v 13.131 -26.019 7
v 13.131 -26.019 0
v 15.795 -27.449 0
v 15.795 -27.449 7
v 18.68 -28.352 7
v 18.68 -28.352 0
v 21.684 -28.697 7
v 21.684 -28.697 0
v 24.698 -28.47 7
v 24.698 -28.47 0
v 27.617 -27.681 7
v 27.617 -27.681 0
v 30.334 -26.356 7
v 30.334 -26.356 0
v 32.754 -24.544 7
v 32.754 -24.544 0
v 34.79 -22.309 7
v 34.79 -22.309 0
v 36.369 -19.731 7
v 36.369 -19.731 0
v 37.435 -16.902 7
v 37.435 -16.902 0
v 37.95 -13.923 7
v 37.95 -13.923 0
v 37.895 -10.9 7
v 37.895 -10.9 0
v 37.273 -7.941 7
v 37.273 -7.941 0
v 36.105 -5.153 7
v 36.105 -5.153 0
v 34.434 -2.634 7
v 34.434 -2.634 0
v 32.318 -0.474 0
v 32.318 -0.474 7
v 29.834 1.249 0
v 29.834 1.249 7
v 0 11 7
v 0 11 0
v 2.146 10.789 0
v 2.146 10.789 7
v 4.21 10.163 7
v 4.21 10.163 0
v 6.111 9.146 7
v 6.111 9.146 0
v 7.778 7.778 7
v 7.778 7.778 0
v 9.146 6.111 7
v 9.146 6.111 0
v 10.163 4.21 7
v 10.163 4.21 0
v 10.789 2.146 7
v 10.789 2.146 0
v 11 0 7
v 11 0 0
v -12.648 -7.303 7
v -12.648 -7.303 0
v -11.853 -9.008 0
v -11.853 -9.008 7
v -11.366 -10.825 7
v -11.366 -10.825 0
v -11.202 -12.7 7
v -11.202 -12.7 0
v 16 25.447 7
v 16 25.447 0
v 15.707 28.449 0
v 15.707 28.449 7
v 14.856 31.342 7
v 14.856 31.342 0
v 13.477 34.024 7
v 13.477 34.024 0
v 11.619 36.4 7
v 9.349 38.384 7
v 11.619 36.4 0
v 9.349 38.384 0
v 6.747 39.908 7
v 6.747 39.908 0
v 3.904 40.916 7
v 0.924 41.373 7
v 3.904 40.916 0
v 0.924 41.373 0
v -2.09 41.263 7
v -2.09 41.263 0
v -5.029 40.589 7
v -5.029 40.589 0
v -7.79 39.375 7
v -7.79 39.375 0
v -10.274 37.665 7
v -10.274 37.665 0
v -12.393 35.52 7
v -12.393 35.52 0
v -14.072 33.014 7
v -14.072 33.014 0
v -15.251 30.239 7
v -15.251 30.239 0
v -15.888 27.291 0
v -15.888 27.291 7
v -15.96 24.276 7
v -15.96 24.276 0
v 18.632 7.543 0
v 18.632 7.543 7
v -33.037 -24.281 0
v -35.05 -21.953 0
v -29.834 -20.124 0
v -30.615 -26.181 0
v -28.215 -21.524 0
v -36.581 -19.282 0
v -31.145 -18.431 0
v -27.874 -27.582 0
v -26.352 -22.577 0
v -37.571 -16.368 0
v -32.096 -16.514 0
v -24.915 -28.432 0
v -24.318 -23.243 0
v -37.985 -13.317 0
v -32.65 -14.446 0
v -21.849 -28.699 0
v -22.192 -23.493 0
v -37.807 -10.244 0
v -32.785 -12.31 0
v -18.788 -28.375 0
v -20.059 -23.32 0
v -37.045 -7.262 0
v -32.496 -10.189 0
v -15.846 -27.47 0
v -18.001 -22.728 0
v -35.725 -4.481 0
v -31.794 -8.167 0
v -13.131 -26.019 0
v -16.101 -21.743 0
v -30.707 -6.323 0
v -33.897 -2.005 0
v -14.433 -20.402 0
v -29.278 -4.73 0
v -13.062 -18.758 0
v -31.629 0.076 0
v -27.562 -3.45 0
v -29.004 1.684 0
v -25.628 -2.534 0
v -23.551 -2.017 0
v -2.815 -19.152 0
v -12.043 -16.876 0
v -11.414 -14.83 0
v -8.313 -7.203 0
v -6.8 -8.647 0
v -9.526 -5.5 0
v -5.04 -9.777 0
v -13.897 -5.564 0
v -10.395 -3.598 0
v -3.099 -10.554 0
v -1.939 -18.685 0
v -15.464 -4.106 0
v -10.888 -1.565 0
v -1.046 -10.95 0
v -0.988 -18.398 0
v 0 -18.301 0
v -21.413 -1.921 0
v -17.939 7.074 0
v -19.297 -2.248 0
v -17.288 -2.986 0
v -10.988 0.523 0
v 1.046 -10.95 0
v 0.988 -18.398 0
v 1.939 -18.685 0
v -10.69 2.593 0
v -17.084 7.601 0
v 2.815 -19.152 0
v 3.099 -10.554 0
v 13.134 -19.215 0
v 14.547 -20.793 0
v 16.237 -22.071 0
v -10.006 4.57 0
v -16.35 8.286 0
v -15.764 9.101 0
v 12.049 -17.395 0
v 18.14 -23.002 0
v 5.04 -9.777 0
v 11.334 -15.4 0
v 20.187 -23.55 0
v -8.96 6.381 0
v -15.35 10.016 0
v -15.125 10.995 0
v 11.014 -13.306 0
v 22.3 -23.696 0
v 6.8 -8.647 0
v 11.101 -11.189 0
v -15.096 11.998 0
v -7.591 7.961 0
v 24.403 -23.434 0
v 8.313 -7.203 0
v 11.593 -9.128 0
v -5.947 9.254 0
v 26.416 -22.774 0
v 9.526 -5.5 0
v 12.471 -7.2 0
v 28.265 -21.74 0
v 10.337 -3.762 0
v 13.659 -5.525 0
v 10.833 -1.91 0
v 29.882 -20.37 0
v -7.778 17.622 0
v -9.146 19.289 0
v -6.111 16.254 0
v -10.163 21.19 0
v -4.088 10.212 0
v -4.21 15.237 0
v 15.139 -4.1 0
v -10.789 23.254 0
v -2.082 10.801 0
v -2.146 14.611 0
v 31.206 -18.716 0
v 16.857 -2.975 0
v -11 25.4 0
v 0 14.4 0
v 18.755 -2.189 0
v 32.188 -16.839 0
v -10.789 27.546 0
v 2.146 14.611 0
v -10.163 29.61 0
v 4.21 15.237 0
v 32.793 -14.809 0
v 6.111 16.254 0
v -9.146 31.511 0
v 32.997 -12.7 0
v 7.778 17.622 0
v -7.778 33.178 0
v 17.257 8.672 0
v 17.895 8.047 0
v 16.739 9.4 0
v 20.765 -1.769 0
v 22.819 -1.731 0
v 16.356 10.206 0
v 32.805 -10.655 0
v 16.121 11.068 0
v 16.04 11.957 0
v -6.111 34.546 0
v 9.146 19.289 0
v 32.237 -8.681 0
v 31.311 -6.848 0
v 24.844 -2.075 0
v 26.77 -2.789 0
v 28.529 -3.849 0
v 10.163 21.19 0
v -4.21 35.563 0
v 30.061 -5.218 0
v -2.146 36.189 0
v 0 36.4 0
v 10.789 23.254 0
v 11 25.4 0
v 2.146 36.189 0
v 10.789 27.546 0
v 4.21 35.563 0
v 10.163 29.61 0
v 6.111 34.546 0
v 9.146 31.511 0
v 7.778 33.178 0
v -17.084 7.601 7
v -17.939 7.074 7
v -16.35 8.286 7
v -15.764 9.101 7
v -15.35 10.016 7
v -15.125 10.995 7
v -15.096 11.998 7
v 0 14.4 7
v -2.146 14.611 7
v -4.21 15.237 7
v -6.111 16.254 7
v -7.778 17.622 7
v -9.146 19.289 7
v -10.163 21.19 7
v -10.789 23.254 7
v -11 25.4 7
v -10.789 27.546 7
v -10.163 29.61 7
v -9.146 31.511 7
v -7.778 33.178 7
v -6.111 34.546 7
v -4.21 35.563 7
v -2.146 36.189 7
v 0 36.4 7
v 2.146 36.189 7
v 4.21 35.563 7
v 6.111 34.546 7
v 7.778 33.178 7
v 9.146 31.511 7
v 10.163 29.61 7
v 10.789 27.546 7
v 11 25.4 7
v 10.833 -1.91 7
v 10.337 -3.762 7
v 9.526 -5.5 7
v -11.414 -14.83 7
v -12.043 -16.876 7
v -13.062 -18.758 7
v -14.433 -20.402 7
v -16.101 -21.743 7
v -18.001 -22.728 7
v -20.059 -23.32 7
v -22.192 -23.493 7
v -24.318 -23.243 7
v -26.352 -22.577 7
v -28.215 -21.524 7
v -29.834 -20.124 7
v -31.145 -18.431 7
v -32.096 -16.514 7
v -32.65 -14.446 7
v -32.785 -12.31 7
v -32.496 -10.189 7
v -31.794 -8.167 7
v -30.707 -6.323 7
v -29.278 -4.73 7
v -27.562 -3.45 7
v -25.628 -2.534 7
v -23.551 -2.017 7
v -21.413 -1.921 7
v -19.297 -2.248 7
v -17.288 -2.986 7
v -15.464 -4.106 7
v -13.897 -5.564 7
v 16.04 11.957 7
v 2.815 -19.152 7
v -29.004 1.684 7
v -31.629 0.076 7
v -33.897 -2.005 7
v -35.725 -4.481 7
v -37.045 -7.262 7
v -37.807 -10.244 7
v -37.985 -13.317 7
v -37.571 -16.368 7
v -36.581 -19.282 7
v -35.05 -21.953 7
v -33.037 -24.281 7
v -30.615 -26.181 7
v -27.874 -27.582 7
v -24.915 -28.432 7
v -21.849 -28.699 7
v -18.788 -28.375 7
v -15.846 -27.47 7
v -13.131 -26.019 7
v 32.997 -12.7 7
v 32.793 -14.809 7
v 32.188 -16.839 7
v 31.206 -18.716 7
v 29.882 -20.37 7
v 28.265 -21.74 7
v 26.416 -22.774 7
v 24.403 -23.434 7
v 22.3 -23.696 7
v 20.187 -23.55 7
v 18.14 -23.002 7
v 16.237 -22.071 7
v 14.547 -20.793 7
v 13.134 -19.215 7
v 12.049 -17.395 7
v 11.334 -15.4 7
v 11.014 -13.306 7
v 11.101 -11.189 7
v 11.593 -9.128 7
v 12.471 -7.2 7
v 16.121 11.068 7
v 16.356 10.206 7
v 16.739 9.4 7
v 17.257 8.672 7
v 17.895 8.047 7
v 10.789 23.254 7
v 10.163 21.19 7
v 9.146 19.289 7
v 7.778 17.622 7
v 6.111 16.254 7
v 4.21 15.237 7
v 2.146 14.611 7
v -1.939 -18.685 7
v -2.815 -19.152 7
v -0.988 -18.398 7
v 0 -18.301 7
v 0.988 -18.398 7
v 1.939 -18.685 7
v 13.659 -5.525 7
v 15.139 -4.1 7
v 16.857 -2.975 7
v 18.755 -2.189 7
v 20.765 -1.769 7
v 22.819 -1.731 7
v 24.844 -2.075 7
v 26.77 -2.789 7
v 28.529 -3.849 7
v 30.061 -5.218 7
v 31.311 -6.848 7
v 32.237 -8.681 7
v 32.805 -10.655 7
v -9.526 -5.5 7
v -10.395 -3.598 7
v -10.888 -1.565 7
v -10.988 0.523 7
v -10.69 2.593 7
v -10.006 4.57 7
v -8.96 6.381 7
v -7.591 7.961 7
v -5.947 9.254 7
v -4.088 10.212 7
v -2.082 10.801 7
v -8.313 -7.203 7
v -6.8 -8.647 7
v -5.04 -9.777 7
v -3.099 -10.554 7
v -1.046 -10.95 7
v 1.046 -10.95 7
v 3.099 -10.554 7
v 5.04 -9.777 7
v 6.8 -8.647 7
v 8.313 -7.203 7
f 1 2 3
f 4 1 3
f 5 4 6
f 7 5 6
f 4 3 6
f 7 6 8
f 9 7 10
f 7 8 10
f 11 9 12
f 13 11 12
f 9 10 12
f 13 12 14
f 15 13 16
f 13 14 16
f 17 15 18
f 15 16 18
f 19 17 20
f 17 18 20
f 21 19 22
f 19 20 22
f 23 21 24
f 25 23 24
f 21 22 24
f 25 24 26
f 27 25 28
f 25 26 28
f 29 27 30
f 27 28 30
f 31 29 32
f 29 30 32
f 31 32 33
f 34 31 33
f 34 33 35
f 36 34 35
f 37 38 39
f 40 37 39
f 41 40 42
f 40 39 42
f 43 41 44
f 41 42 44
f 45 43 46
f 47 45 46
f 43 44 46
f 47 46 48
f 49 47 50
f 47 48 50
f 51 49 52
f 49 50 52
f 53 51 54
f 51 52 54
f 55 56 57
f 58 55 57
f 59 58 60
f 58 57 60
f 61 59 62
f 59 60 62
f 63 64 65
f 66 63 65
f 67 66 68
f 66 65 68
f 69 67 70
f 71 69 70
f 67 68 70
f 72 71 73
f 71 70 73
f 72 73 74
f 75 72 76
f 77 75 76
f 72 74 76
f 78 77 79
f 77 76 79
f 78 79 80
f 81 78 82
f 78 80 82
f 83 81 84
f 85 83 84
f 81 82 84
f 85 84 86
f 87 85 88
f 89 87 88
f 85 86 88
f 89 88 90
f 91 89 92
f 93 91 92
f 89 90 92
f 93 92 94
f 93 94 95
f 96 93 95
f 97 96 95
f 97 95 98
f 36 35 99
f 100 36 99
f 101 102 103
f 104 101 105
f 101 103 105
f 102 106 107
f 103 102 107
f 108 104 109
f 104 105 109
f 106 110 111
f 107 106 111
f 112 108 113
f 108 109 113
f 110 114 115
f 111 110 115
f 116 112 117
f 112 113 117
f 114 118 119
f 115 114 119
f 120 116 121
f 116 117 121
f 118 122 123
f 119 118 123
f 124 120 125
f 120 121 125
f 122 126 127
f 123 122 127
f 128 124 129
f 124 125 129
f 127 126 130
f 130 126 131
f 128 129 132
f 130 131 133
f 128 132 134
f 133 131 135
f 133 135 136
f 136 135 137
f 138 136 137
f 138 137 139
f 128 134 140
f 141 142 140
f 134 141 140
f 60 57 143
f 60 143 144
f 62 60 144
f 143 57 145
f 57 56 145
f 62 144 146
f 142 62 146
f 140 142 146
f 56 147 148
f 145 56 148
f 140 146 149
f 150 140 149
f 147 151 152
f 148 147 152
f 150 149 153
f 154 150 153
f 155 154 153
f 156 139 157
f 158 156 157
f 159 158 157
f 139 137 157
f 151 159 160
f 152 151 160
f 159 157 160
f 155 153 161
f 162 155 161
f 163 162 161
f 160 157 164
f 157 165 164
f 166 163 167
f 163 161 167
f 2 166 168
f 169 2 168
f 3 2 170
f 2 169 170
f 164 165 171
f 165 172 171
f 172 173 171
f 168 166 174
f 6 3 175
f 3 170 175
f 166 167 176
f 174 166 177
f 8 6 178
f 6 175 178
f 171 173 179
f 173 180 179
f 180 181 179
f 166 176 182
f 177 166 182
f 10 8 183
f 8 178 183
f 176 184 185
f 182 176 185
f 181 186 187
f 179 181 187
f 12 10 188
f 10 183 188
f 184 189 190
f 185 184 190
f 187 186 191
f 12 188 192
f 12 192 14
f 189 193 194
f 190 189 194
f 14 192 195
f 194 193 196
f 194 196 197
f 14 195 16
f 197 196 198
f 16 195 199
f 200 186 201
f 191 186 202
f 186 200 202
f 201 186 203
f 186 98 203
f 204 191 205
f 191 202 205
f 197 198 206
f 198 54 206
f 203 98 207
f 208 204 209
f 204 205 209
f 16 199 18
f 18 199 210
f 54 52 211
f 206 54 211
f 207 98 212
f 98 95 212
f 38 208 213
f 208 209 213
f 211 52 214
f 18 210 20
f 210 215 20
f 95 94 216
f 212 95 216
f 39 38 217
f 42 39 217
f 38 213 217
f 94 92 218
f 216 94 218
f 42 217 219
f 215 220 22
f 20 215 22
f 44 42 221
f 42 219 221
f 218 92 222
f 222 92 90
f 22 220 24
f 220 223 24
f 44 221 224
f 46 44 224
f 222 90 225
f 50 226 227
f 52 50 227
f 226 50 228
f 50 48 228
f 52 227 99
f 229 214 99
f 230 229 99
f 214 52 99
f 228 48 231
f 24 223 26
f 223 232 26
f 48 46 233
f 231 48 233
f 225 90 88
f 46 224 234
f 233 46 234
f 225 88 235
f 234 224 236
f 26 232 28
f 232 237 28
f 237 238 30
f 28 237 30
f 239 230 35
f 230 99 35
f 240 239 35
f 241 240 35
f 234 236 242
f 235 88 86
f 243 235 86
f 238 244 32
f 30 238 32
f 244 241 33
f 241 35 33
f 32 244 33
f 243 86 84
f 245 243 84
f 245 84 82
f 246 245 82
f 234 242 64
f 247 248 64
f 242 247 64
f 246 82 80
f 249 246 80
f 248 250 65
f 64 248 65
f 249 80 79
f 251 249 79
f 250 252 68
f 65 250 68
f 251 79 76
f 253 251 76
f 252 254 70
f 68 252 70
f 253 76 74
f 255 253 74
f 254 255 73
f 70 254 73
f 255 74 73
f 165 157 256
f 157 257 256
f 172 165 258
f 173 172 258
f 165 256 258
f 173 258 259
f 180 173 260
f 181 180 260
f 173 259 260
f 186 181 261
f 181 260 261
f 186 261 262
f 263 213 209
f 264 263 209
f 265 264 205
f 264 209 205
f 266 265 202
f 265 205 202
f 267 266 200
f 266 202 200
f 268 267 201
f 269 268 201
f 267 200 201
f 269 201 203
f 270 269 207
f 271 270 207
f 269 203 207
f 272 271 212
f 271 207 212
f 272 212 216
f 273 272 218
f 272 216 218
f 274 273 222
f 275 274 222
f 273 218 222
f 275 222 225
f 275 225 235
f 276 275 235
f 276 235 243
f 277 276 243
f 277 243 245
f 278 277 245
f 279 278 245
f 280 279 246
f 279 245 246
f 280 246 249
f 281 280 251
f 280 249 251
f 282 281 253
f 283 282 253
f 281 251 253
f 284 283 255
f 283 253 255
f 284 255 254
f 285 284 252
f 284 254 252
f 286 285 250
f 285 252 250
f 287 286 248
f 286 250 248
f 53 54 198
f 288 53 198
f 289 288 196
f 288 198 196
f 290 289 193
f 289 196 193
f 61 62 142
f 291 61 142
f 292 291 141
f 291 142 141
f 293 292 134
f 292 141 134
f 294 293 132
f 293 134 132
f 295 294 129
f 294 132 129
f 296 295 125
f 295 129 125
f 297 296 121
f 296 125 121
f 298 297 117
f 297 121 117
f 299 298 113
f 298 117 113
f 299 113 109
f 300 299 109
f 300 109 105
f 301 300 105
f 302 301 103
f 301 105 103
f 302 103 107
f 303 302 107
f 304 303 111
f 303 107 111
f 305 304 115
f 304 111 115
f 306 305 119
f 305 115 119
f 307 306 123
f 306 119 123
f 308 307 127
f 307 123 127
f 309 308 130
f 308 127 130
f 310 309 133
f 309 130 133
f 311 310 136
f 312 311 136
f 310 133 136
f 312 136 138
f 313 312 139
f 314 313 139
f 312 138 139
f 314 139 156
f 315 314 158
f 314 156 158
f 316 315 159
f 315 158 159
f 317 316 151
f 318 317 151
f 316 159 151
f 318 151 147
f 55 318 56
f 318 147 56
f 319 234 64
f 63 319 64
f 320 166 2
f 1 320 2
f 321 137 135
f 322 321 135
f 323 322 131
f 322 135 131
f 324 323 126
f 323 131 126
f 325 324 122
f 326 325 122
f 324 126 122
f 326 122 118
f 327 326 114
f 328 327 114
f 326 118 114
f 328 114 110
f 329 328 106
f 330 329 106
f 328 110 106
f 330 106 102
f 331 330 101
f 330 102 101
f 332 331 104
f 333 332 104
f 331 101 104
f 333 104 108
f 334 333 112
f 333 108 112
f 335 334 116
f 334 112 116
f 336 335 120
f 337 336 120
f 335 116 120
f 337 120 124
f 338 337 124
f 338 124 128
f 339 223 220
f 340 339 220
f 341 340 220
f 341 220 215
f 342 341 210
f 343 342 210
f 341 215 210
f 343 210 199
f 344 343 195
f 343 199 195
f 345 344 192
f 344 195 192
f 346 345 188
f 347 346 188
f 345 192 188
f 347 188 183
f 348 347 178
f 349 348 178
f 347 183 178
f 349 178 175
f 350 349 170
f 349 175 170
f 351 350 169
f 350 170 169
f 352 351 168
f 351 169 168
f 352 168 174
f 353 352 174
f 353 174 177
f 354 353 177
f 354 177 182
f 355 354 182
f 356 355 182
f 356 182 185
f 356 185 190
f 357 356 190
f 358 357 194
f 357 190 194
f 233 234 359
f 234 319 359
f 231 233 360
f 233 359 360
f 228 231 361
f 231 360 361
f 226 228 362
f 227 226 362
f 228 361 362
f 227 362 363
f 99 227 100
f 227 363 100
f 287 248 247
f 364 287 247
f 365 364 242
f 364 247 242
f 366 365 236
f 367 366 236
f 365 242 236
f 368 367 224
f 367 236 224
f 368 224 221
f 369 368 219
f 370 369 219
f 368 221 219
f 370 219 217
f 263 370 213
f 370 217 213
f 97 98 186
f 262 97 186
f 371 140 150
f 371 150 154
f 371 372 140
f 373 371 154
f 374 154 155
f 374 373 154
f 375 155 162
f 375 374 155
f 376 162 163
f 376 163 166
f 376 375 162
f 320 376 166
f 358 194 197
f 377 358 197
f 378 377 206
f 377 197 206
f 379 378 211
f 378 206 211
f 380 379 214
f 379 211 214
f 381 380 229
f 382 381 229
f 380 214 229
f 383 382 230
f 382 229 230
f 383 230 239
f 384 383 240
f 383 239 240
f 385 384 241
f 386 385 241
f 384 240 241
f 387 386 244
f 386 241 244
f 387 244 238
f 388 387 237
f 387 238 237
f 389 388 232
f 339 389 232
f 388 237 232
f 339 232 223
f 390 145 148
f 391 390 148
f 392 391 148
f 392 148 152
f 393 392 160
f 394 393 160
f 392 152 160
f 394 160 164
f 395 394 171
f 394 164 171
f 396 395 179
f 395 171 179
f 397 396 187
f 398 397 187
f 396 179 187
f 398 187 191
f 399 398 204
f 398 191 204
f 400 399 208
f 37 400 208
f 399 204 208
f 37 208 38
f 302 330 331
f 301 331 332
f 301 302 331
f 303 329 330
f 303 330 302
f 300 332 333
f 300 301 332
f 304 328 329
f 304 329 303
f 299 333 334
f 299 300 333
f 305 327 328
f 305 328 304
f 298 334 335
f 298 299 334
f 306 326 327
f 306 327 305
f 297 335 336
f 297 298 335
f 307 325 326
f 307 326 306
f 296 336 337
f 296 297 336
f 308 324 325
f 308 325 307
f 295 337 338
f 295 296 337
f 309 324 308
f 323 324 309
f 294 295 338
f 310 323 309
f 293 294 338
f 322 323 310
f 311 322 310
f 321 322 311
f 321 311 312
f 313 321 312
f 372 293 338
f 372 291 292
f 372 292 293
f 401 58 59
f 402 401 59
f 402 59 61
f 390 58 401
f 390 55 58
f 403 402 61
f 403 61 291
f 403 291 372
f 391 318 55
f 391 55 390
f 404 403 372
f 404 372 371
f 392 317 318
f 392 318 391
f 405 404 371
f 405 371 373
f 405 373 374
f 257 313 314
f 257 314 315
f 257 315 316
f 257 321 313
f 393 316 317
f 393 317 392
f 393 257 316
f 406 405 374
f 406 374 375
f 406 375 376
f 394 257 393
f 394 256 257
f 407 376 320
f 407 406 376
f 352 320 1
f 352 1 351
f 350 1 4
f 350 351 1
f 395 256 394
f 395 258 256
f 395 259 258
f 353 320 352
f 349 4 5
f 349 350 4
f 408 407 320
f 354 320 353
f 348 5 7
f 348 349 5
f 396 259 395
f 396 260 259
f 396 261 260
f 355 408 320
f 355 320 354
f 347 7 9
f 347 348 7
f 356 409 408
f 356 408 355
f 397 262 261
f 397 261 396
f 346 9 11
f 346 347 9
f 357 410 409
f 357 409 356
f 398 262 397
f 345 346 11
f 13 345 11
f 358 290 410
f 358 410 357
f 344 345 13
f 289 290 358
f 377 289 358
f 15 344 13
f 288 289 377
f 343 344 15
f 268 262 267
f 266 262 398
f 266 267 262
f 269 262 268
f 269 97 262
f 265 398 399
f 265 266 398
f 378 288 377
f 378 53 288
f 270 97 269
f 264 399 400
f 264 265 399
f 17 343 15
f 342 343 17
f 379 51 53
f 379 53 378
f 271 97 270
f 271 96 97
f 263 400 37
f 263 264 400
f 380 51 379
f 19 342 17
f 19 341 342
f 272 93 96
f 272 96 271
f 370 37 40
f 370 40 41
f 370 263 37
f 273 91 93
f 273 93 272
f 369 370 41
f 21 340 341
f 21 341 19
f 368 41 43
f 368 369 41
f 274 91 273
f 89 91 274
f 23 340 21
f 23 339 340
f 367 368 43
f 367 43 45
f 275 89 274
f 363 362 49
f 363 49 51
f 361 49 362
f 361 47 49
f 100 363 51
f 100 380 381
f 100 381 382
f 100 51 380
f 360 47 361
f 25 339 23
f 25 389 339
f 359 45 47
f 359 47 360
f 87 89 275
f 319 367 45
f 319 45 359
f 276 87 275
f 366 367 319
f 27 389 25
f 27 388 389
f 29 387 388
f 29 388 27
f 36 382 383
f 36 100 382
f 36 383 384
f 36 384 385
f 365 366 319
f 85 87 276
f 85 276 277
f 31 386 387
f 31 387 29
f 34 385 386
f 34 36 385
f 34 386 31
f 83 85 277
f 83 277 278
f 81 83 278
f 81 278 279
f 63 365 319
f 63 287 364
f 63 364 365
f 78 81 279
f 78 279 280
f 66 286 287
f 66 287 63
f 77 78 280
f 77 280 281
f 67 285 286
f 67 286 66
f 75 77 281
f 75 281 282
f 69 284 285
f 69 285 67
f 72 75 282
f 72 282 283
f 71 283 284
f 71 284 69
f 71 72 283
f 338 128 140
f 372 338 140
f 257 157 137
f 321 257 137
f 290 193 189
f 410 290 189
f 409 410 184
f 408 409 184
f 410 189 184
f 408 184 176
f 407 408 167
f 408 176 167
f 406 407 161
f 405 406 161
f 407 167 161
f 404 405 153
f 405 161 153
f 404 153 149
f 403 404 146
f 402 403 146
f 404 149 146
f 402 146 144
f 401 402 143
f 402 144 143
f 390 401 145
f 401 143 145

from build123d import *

# Parameters (mm, degrees)
F1_DEPTH = 7
F2_R     = 5.08


with BuildPart() as f1:
    # F0 (on Top) → F1 (new body)
    with BuildSketch(Plane.XY):
        with BuildLine():
            Line((-14.855128, 8.576612), (-29.004115, 1.684053))
            ThreePointArc((-29.004115, 1.684053), (-35.87974, -20.654294), (-13.131215, -26.019049))
            Line((-13.131215, -26.019049), (0, -17.27825))
            Line((0, -17.27825), (13.131215, -26.019049))
            ThreePointArc((13.131215, -26.019049), (35.640928, -21.0573), (29.833927, 1.249311))
            Line((29.833927, 1.249311), (16.048566, 8.994085))
            Line((16.048566, 8.994085), (15.99993, 25.447296))
            ThreePointArc((15.99993, 25.447296), (-0.585843, 41.389271), (-15.96049, 24.276274))
            Line((-15.96049, 24.276274), (-14.855128, 8.576612))
        make_face()
        with BuildLine():
            ThreePointArc((-11.202065, -12.7), (-32.424195, -15.493946), (-12.648318, -7.30251))
            ThreePointArc((-12.648318, -7.30251), (-11.569895, -9.906054), (-11.202065, -12.7))
        make_face(mode=Mode.SUBTRACT)
        with BuildLine():
            ThreePointArc((32.997045, -12.7), (19.150036, -23.325184), (12.470766, -7.2))
            ThreePointArc((12.470766, -7.2), (24.844055, -2.074816), (32.997045, -12.7))
        make_face(mode=Mode.SUBTRACT)
        with BuildLine():
            ThreePointArc((-9.526279, -5.5), (-9.526279, 5.5), (0, 11))
            ThreePointArc((0, 11), (7.778175, 7.778175), (11, 0))
            ThreePointArc((11, 0), (10.625184, -2.847009), (9.526279, -5.5))
            ThreePointArc((9.526279, -5.5), (0, -11), (-9.526279, -5.5))
        make_face(mode=Mode.SUBTRACT)
        with BuildLine():
            ThreePointArc((0, 14.4), (-7.778175, 33.178175), (11, 25.4))
            ThreePointArc((11, 25.4), (7.778175, 17.621825), (0, 14.4))
        make_face(mode=Mode.SUBTRACT)
    extrude(amount=F1_DEPTH)

    # F2
    f2_edges = [f1.edges().sort_by_distance(p)[0] for p in [
        (-14.855128, 8.576612, 3.5),
        (16.048566, 8.994085, 3.5),
        (0, -17.27825, 3.5),
    ]]
    fillet(f2_edges, radius=F2_R)


solid = f1.part
